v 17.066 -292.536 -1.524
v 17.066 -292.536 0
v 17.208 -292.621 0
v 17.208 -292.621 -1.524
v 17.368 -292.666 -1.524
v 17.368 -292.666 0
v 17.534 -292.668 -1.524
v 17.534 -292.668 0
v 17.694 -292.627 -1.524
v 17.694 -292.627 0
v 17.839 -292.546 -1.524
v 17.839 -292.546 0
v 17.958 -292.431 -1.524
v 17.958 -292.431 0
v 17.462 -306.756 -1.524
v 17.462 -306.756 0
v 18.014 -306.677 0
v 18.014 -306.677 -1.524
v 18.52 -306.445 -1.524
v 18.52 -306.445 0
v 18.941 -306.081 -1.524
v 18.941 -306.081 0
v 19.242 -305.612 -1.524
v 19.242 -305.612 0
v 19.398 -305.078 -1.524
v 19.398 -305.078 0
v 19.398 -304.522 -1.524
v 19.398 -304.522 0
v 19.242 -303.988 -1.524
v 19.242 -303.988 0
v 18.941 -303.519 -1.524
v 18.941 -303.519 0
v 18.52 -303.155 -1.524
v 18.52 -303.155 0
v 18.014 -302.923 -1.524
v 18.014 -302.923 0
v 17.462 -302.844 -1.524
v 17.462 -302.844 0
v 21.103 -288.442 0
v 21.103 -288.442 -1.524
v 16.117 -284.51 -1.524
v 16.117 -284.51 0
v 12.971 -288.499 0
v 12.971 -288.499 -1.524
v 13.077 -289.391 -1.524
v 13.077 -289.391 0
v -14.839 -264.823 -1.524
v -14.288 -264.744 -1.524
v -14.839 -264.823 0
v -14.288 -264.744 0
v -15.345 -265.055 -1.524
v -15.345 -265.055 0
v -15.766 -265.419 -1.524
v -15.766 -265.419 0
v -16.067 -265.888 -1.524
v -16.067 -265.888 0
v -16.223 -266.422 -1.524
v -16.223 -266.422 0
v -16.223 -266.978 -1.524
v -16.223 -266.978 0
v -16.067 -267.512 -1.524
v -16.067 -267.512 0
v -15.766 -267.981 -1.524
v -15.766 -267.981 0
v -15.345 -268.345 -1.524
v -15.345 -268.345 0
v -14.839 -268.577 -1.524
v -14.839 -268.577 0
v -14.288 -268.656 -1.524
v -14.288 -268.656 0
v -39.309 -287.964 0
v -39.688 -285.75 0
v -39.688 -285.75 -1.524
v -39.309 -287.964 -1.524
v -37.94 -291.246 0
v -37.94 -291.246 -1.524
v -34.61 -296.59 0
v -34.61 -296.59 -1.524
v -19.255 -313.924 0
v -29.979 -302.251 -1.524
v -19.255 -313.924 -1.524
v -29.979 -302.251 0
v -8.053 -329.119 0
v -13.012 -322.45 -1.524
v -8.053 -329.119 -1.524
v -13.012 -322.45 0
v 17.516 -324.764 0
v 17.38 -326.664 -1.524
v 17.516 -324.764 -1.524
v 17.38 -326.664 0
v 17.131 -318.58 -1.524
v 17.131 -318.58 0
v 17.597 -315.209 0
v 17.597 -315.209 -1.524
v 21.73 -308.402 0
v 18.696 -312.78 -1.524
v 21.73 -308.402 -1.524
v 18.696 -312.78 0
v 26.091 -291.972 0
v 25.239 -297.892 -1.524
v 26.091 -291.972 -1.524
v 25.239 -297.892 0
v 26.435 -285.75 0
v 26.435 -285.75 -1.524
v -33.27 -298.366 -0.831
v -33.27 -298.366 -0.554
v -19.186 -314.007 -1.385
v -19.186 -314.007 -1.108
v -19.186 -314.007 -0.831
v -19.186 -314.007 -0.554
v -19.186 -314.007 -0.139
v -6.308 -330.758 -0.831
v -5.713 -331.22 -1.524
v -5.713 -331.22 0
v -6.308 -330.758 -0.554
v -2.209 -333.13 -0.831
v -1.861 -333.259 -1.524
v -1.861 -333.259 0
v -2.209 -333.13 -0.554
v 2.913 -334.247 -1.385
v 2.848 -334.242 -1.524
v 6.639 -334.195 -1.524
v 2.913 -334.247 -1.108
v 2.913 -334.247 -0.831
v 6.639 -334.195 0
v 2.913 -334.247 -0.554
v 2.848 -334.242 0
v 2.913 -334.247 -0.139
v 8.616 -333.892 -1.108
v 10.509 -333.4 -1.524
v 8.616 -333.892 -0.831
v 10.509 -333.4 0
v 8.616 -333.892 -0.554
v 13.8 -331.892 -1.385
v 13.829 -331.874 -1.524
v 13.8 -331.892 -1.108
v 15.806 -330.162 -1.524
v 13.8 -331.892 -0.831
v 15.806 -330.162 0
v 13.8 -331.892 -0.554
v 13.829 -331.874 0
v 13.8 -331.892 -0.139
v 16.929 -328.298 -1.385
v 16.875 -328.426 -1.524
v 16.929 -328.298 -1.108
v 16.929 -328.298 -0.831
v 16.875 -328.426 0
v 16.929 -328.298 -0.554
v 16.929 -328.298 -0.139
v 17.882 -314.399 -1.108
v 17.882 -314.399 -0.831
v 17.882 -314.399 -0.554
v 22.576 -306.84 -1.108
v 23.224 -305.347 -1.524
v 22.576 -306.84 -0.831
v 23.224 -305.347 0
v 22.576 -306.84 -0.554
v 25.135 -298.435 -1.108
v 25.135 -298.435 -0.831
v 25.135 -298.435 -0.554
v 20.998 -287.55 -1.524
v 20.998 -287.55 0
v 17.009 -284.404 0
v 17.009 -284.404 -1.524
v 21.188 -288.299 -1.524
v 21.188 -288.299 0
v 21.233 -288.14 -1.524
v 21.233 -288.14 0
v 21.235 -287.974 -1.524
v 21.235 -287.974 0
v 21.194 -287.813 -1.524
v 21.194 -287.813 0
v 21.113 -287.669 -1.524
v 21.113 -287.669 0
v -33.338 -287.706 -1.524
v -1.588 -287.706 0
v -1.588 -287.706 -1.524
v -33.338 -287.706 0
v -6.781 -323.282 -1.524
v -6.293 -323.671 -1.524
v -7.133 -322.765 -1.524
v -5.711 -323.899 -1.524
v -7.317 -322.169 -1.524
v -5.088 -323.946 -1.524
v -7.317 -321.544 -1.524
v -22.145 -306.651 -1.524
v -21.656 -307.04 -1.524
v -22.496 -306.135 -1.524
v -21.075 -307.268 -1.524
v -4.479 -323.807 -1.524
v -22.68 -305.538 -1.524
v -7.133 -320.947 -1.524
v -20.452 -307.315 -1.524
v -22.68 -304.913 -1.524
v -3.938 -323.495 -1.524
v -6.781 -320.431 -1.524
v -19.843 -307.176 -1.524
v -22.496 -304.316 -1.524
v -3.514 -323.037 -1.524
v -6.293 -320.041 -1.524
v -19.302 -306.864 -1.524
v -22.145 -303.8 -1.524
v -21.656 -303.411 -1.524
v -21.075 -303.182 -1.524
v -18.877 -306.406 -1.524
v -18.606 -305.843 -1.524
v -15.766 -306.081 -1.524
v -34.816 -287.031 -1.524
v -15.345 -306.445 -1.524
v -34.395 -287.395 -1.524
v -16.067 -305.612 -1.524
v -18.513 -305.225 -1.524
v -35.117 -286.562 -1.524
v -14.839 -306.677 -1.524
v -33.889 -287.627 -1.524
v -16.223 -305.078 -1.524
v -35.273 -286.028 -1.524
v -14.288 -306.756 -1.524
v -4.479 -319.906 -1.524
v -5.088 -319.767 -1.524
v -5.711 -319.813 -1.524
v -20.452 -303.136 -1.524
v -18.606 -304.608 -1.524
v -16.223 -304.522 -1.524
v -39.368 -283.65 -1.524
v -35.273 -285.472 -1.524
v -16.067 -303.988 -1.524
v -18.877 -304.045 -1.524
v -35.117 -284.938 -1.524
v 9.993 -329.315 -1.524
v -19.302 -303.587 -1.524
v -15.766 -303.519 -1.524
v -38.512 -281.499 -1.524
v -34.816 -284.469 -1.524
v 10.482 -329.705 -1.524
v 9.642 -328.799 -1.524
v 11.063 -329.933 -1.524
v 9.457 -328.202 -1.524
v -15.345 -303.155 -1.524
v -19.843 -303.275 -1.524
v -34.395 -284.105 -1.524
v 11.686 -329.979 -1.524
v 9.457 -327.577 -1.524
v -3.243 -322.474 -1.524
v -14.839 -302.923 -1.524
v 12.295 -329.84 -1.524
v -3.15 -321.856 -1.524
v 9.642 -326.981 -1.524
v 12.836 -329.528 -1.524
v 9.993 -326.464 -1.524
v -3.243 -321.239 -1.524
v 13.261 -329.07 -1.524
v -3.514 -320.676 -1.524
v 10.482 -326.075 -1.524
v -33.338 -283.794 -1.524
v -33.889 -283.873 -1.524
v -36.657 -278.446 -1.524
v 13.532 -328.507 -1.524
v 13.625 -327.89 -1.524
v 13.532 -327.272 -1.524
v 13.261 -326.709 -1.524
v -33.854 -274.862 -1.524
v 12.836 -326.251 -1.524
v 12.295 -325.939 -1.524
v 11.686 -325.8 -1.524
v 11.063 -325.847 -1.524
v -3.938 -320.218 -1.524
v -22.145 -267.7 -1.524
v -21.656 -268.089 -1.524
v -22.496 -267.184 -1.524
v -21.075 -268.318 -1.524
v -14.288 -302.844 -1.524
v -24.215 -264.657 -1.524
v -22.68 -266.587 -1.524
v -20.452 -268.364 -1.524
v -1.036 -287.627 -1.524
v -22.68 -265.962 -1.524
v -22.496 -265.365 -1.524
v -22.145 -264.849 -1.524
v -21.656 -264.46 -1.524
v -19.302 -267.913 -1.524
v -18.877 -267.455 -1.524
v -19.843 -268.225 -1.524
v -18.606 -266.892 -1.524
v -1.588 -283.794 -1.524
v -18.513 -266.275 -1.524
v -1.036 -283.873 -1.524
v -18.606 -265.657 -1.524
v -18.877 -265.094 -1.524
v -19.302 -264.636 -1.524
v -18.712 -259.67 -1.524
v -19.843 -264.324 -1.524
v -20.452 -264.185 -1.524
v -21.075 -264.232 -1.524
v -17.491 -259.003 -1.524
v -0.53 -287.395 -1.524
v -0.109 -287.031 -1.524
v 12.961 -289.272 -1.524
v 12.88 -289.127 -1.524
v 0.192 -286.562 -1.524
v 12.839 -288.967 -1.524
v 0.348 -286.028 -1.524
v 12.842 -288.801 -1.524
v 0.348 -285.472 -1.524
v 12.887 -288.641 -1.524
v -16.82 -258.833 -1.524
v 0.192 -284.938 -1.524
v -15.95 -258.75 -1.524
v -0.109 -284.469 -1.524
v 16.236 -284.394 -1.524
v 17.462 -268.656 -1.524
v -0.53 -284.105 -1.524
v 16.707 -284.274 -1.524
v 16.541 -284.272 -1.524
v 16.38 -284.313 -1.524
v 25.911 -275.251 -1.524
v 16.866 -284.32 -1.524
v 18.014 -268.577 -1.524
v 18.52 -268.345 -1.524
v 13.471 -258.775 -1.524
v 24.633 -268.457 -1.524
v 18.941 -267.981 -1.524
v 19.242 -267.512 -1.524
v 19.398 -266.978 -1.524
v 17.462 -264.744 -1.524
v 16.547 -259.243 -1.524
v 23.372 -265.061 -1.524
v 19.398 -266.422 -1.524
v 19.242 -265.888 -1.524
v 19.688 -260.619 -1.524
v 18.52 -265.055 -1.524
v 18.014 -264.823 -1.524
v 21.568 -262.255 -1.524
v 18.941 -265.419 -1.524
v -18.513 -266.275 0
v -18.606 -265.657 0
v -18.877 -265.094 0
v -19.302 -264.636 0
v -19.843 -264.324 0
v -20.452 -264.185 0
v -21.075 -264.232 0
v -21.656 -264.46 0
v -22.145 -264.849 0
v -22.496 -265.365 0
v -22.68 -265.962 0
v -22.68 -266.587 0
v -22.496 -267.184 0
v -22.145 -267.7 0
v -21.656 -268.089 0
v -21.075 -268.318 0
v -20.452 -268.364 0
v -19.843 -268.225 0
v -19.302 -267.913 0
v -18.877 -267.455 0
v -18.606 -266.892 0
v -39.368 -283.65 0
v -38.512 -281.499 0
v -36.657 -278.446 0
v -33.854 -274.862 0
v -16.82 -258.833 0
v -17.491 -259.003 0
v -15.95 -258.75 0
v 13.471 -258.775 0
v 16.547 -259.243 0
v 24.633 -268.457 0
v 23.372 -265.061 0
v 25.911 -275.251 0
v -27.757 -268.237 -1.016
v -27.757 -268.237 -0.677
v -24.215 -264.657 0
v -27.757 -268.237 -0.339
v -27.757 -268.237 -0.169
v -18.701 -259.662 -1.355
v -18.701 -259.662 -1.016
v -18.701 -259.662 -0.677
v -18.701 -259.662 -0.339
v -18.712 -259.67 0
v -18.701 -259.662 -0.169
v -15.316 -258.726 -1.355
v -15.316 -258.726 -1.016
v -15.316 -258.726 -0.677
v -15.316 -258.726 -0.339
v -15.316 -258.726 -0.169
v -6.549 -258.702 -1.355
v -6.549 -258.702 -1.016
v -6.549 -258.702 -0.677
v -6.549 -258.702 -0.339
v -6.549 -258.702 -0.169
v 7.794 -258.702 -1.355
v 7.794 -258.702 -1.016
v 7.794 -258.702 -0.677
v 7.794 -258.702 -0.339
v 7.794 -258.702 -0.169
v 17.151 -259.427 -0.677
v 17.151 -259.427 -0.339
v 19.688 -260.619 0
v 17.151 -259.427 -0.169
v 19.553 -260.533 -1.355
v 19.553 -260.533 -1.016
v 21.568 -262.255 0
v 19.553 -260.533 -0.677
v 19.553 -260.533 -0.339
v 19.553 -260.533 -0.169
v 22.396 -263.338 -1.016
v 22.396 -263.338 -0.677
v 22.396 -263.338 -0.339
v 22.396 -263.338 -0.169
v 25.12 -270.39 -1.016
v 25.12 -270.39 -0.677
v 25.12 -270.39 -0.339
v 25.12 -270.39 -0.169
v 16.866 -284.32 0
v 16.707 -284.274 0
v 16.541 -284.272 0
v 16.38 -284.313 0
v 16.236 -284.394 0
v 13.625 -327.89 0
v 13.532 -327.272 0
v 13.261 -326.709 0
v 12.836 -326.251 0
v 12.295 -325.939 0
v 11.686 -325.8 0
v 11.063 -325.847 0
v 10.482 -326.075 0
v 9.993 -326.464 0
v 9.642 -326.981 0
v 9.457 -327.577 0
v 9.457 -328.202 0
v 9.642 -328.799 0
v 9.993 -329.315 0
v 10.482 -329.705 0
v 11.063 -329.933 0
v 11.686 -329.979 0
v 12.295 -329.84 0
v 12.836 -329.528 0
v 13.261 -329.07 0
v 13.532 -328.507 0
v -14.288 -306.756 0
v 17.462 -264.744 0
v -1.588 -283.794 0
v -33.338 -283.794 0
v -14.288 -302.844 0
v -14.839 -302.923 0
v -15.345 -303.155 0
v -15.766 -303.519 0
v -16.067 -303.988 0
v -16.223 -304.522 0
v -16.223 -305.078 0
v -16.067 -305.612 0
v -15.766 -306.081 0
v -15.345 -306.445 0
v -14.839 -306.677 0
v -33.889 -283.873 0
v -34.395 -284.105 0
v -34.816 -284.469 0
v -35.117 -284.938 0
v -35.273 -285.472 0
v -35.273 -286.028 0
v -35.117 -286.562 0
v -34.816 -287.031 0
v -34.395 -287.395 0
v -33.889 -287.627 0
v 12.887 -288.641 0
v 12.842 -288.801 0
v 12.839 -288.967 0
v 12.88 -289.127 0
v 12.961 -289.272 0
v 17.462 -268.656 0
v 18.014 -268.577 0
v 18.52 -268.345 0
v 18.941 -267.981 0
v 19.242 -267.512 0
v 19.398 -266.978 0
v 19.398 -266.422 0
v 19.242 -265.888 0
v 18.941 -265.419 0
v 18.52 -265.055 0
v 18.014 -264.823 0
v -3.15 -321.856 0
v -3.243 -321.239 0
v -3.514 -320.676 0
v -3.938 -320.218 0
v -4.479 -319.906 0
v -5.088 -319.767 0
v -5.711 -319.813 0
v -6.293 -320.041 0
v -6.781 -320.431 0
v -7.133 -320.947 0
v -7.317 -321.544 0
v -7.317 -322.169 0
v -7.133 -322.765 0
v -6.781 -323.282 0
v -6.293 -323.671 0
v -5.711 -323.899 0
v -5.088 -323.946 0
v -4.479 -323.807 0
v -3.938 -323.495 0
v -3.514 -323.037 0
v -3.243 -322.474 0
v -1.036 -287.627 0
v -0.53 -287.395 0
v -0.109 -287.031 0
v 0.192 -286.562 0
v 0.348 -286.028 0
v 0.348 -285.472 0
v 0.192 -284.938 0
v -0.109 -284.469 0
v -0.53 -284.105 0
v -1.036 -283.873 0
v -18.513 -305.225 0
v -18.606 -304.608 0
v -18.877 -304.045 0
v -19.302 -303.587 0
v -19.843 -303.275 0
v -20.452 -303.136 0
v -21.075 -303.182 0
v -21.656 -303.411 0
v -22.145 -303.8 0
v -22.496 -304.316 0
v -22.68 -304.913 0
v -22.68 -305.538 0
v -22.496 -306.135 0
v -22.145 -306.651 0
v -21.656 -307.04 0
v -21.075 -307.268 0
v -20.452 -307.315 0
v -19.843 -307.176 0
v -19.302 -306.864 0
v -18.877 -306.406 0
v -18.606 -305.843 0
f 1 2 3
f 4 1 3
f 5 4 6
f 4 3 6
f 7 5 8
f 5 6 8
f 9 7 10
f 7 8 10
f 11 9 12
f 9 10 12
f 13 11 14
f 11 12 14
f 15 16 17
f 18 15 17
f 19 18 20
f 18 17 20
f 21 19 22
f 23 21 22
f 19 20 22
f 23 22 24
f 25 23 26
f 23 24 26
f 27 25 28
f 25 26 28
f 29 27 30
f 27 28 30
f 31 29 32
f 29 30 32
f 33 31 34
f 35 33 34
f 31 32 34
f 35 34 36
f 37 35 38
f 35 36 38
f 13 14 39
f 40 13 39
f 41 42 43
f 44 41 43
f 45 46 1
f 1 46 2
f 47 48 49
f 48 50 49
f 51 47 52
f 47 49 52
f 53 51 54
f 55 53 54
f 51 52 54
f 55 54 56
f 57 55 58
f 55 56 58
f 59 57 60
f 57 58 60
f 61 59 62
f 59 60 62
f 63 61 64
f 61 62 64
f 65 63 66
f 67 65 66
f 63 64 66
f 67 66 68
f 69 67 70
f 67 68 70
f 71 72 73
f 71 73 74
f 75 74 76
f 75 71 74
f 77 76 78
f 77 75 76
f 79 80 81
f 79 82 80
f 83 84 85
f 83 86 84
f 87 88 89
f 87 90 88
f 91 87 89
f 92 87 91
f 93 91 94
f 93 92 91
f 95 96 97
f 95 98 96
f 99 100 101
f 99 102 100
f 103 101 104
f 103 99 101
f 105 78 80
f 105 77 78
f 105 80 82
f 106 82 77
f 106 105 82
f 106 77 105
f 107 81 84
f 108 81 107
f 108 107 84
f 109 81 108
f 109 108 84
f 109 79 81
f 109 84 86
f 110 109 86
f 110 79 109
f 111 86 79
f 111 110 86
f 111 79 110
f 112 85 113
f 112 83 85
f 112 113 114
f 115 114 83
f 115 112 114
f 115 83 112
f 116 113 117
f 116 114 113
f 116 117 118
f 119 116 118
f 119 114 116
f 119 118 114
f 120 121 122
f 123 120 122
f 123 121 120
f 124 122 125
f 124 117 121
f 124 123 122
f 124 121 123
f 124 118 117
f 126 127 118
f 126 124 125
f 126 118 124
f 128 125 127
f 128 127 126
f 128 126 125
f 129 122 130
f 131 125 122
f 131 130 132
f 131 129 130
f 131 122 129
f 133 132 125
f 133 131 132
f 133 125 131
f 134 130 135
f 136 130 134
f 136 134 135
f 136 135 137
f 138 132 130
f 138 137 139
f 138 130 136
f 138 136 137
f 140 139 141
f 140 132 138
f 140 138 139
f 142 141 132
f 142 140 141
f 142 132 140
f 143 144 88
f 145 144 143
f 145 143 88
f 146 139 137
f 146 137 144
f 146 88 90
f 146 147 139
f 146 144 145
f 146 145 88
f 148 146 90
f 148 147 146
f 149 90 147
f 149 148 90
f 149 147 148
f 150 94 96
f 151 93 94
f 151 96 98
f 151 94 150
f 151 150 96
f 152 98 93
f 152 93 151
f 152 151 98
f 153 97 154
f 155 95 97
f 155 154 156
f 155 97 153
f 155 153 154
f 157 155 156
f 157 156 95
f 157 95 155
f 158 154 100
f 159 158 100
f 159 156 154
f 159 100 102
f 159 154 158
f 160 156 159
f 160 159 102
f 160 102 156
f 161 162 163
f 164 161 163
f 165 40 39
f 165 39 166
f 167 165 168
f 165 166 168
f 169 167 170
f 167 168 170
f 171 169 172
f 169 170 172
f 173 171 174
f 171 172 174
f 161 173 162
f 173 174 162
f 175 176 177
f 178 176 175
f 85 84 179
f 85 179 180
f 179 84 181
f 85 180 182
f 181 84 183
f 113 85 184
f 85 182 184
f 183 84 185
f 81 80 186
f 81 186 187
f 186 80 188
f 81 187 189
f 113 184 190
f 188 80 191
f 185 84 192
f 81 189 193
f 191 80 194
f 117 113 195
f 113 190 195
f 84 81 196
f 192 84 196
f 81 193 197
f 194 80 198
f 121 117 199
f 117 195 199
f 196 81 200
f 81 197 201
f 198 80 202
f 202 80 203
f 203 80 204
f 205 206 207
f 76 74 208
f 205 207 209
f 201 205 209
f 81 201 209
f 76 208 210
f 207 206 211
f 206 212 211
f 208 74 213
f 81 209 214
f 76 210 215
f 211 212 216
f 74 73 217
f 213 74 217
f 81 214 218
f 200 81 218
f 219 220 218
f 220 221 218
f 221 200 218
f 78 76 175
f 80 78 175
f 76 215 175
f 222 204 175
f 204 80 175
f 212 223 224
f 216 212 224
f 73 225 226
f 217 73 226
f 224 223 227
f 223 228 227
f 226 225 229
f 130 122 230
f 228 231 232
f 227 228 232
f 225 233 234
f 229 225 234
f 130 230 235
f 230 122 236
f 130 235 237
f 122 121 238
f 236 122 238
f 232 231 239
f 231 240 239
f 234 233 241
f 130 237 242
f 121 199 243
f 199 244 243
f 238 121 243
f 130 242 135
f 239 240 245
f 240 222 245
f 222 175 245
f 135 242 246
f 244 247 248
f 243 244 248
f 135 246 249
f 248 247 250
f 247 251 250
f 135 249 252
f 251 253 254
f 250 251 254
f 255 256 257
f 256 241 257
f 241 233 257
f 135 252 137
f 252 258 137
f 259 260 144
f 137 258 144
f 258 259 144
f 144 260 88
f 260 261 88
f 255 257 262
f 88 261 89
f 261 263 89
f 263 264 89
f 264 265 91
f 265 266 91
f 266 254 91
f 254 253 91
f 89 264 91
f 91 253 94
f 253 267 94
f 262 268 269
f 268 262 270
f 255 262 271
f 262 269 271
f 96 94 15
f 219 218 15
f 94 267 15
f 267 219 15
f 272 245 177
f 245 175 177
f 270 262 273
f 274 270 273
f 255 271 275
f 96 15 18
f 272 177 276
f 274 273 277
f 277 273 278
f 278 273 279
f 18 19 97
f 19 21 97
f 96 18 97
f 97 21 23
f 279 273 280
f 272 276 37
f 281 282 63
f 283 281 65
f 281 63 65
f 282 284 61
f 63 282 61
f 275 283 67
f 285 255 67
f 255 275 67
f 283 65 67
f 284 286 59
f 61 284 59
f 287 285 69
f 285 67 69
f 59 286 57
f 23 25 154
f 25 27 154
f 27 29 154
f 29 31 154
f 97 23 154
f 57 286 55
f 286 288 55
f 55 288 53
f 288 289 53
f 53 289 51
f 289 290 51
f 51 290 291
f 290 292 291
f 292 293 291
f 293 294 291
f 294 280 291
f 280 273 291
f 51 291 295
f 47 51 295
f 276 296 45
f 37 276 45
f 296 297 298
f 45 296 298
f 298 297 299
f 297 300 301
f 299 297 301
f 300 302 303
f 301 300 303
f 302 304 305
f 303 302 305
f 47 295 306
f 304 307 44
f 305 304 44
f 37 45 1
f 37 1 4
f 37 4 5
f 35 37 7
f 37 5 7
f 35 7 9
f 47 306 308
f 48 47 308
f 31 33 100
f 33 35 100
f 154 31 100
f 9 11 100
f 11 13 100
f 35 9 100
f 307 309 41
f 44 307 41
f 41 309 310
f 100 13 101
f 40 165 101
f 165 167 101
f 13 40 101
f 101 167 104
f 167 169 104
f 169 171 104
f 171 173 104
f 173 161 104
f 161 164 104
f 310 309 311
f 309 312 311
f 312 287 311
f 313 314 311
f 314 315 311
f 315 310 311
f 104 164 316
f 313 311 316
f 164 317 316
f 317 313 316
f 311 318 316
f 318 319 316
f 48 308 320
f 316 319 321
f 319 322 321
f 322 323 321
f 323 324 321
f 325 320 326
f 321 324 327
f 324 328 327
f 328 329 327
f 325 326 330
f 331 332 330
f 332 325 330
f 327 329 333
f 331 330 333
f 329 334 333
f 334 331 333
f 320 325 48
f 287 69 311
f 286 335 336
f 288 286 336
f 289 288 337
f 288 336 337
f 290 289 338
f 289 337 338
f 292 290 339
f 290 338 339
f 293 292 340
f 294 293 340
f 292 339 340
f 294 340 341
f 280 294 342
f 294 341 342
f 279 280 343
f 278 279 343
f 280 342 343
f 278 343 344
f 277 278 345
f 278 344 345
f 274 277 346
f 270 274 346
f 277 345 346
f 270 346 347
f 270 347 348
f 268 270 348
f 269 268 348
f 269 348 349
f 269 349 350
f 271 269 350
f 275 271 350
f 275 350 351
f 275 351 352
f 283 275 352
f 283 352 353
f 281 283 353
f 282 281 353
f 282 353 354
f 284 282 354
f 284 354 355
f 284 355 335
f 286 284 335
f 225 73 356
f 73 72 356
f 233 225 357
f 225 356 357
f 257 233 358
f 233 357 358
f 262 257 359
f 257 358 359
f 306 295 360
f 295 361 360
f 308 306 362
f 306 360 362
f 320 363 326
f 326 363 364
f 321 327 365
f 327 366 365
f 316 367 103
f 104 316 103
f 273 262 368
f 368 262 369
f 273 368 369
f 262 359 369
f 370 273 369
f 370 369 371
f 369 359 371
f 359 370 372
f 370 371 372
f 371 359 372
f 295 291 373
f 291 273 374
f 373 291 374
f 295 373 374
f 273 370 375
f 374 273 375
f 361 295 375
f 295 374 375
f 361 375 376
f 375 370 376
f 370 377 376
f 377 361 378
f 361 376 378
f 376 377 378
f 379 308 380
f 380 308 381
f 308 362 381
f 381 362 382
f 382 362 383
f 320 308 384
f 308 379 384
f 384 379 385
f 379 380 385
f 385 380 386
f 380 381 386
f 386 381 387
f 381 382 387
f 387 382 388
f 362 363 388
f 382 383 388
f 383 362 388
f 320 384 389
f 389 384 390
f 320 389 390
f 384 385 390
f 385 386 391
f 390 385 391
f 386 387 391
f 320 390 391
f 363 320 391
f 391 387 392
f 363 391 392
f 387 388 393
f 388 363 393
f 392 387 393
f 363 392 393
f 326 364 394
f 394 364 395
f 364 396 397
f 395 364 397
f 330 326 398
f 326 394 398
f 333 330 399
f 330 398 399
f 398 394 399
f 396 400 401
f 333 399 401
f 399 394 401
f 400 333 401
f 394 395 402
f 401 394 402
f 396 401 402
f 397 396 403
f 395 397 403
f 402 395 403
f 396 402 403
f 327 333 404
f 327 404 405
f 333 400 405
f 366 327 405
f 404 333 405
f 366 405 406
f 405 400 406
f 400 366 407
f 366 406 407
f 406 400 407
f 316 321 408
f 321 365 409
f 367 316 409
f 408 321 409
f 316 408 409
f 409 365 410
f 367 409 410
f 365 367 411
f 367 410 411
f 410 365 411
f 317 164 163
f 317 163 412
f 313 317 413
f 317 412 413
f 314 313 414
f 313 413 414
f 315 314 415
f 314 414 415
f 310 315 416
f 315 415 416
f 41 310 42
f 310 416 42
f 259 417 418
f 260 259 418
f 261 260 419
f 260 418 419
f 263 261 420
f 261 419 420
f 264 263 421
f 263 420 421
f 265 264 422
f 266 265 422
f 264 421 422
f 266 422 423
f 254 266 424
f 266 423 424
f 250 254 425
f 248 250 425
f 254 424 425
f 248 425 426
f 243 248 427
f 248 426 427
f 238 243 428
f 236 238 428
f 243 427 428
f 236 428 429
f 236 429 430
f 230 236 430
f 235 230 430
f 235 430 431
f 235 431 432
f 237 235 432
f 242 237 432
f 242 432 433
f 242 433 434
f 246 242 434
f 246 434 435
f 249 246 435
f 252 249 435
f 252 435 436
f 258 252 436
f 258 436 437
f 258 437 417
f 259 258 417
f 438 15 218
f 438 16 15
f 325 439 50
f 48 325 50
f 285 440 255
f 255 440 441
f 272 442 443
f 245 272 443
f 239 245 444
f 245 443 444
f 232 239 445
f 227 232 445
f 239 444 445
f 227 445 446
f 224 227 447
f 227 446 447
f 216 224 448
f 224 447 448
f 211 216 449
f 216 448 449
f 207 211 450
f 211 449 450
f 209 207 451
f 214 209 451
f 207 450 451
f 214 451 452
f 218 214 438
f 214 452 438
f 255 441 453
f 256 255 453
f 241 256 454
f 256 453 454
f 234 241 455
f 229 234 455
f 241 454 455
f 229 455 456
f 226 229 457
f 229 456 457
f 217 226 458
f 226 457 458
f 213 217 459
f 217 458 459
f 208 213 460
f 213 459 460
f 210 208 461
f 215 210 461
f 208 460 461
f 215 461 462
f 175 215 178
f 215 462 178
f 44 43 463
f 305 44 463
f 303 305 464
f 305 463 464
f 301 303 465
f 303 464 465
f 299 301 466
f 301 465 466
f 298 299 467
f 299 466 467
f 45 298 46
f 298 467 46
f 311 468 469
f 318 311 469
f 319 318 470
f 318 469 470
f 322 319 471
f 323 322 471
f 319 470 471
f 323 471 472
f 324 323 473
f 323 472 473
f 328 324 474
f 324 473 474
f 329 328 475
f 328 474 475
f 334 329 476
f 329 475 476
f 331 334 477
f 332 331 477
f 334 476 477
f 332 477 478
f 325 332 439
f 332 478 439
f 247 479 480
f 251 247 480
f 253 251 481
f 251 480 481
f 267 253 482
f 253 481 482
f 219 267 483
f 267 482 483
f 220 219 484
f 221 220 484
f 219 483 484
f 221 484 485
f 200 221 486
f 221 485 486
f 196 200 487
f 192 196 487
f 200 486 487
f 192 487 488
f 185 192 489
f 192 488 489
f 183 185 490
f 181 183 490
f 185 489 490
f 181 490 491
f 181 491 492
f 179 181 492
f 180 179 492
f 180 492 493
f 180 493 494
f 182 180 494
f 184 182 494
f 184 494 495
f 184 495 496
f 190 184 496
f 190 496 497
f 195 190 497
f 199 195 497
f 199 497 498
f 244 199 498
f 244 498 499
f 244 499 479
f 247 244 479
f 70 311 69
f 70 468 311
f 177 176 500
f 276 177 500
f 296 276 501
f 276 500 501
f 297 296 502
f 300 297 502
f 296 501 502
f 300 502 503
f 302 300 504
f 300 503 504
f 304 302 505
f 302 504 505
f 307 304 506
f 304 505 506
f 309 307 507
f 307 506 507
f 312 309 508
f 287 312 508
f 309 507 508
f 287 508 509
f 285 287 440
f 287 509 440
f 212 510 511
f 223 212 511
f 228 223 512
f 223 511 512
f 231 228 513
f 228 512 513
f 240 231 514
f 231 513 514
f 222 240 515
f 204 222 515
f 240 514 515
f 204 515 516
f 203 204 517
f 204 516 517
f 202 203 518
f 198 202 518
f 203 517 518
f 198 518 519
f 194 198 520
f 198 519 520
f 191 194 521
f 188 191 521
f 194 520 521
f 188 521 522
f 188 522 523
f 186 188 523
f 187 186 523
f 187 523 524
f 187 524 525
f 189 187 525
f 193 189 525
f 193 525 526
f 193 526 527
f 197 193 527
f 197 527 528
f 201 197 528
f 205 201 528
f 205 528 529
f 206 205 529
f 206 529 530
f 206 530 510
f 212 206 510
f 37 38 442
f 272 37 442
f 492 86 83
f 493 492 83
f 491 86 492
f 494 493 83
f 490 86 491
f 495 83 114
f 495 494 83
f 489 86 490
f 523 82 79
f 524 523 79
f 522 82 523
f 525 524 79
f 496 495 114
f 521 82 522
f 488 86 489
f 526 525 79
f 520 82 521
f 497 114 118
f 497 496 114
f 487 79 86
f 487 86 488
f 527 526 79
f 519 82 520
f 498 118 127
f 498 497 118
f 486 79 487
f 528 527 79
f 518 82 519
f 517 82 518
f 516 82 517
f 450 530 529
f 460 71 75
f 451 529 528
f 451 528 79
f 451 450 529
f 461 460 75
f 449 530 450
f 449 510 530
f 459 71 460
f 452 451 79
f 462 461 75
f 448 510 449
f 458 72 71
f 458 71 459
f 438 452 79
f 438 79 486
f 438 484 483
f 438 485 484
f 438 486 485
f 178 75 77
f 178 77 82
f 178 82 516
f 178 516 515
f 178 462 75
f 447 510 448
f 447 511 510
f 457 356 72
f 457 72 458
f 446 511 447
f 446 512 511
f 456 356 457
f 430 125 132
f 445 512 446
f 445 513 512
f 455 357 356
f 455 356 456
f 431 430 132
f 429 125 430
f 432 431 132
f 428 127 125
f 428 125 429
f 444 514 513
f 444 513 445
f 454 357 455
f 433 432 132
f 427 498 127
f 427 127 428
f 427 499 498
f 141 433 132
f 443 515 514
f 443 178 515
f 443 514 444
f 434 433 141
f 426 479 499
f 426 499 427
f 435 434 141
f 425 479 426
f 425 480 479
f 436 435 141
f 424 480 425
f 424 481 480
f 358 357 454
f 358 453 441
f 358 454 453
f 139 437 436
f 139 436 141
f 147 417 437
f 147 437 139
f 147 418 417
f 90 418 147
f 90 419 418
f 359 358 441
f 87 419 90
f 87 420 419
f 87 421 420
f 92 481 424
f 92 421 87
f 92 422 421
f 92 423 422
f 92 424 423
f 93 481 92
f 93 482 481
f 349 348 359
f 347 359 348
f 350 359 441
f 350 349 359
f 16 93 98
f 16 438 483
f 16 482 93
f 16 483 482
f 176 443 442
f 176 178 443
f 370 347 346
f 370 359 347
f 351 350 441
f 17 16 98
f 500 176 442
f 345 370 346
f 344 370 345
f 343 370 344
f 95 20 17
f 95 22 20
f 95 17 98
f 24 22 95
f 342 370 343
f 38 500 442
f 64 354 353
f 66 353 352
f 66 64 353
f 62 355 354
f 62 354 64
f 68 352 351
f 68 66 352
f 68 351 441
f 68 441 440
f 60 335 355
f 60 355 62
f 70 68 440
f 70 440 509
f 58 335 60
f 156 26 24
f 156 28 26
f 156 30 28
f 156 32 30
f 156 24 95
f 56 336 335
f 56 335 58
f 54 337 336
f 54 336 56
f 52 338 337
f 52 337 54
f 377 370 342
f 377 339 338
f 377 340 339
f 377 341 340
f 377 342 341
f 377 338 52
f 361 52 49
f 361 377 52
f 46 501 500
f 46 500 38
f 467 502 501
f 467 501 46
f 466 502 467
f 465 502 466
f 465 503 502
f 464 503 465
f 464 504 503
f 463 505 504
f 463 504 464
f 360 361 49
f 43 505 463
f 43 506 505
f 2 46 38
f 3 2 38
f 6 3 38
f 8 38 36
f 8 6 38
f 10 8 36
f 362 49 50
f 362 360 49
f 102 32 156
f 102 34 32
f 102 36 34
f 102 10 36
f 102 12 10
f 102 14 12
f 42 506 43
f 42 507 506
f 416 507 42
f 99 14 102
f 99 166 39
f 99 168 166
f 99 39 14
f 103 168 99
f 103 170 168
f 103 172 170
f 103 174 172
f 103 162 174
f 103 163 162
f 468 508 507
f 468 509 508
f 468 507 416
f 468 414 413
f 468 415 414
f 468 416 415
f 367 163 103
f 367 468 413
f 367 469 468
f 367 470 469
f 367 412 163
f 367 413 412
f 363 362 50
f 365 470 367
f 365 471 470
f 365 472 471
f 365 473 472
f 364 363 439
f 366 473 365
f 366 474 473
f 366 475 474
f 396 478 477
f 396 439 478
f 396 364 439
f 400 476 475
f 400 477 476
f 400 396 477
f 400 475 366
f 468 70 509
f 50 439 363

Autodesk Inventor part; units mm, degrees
ref_plane "YZ Plane" through (0, 0, 0) normal (1, 0, 0) x (0, 1, 0)
ref_plane "XZ Plane" through (0, 0, 0) normal (0, 1, 0) x (-1, 0, 0)
ref_plane "XY Plane" through (0, 0, 0) normal (0, 0, 1) x (1, 0, 0)
sketch "Sketch1" plane through (0, 0, 0) normal (0, 0, 1) x (1, 0, 0)
  line L0 (-1.5875, -283.7942) -> (-33.3375, -283.7942)
  line L1 (-1.5875, -287.7058) -> (-33.3375, -287.7058)
  arc A0 (-33.3375, -283.7942) -> (-33.3375, -287.7058) centre (-33.3375, -285.75) ccw
  arc A1 (-1.5875, -287.7058) -> (-1.5875, -283.7942) centre (-1.5875, -285.75) ccw
  line L2 (17.4625, -264.7442) -> (-14.2875, -264.7442)
  line L3 (17.4625, -268.6558) -> (-14.2875, -268.6558)
  arc A2 (-14.2875, -264.7442) -> (-14.2875, -268.6558) centre (-14.2875, -266.7) ccw
  arc A3 (17.4625, -268.6558) -> (17.4625, -264.7442) centre (17.4625, -266.7) ccw
  arc A4 (17.4625, -306.7558) -> (17.4625, -302.8442) centre (17.4625, -304.8) ccw
  line L4 (17.4625, -306.7558) -> (-14.2875, -306.7558)
  arc A5 (-14.2875, -302.8442) -> (-14.2875, -306.7558) centre (-14.2875, -304.8) ccw
  line L5 (17.4625, -302.8442) -> (-14.2875, -302.8442)
  line L6 (-1.5875, -285.75) -> (-33.3375, -285.75)
  line L7 (-39.6875, -285.75) -> (-39.6875, -281.3199) construction
  line L8 (-39.6875, -281.3199) -> (-31.1834, -271.3984) construction
  line L9 (-31.1834, -271.3984) -> (-18.9197, -259.2751) construction
  line L10 (-18.9197, -259.2751) -> (-17.4625, -258.7024) construction
  line L11 (-17.4625, -258.7024) -> (-13.3504, -258.7024) construction
  line L12 (-13.3504, -258.7024) -> (-9.7175, -258.7024) construction
  line L13 (-9.7175, -258.7024) -> (-3.3988, -258.7024) construction
  line L14 (-3.3988, -258.7024) -> (0.4625, -258.7024) construction
  line L15 (0.4625, -258.7024) -> (15.1943, -258.7024) construction
  line L16 (15.1943, -258.7024) -> (17.4625, -258.7024) construction
  line L17 (17.4625, -258.7024) -> (26.4353, -264.5027) construction
  line L18 (26.4353, -264.5027) -> (26.4353, -285.75) construction
  spline S0 degree 4 poles (-39.6875, -285.75) (-39.6875, -281.3199) (-31.1834, -271.3984) (-18.9197, -259.2751) (-17.4625, -258.7024) (-13.3504, -258.7024) (-9.7175, -258.7024) (-3.3988, -258.7024) (0.4625, -258.7024) (15.1943, -258.7024) (17.4625, -258.7024) (26.4353, -264.5027) (26.4353, -285.75) knots 1 1 1 1 1 2 3 4 5 6 7 8 9 10 10 10 10 10
  line L19 (20.9977, -287.5498) -> (17.0087, -284.4043)
  arc A6 (21.1032, -288.4416) -> (20.9977, -287.5498) centre (20.6045, -288.0484) ccw
  line L20 (17.9577, -292.4306) -> (21.1032, -288.4416)
  arc A7 (17.0659, -292.5361) -> (17.9577, -292.4306) centre (17.4591, -292.0375) ccw
  line L21 (13.0768, -289.3906) -> (17.0659, -292.5361)
  arc A8 (12.9714, -288.4988) -> (13.0768, -289.3906) centre (13.47, -288.892) ccw
  line L22 (16.1169, -284.5098) -> (12.9714, -288.4988)
  arc A9 (17.0087, -284.4043) -> (16.1169, -284.5098) centre (16.6155, -284.9029) ccw
  circle A10 centre (-20.6084, -305.2253) radius 2.0955
  circle A11 centre (-20.6084, -266.2747) radius 2.0955
  circle A12 centre (11.5295, -327.8898) radius 2.0955
  line L23 (-39.6875, -285.75) -> (-39.6875, -288.4988) construction
  line L24 (-39.6875, -288.4988) -> (-35.4355, -296.4735) construction
  line L25 (-35.4355, -296.4735) -> (-28.6542, -303.7638) construction
  line L26 (-28.6542, -303.7638) -> (-22.7039, -309.9306) construction
  line L27 (-22.7039, -309.9306) -> (-15.6661, -317.7268) construction
  line L28 (-15.6661, -317.7268) -> (-9.739, -328.1678) construction
  line L29 (-9.739, -328.1678) -> (-3.3988, -334.115) construction
  line L30 (-3.3988, -334.115) -> (8.8016, -335.3618) construction
  line L31 (8.8016, -335.3618) -> (20.2246, -329.5087) construction
  line L32 (20.2246, -329.5087) -> (15.3145, -317.7268) construction
  line L33 (15.3145, -317.7268) -> (19.5304, -310.4349) construction
  line L34 (19.5304, -310.4349) -> (24.1196, -307.3208) construction
  line L35 (24.1196, -307.3208) -> (26.4353, -292.0468) construction
  line L36 (26.4353, -292.0468) -> (26.4353, -285.75) construction
  spline S1 degree 4 poles (-39.6875, -285.75) (-39.6875, -288.4988) (-35.4355, -296.4735) (-28.6542, -303.7638) (-22.7039, -309.9306) (-15.6661, -317.7268) (-9.739, -328.1678) (-3.3988, -334.115) (8.8016, -335.3618) (20.2246, -329.5087) (15.3145, -317.7268) (19.5304, -310.4349) (24.1196, -307.3208) (26.4353, -292.0468) (26.4353, -285.75) knots 1 1 1 1 1 2 3 4 5 6 7 8 9 10 11 12 12 12 12 12
  circle A13 centre (-5.245, -321.8562) radius 2.0955
  point P0 (0, 0)
  point P1 (-7.9375, -285.75)
  point P2 (11.1125, -266.7)
  point P3 (11.1125, -304.8)
  point P4 (19.4183, -304.8)
  dimension "d0" = 31.75
  dimension "d3" = 0
  dimension "d4" = 3.9116
  dimension "d5" = 0
  dimension "d8" = 3.9116
  dimension "d9" = 0
  dimension "d10" = 31.75
  dimension "d11" = 0
  dimension "d12" = 6.35
  dimension "d13" = 6.35
  dimension "d14" = 3.9116
  dimension "d15" = 0
  dimension "d16" = 31.75
  dimension "d19" = 0
  dimension "d20" = 6.35
  dimension "d57" = 6.35
  dimension "d58" = 0
  dimension "d60" = 0
  dimension "d61" = 7.017
  dimension "d64" = 4.191
  dimension "d67" = 4.191
  dimension "d70" = 4.191
  dimension "d73" = 4.191
extrude "Extrusion3" add sketch "Sketch1" against normal blind 1.524
equation "\"d8\" = d4"
equation "\"d10\" = d0"
equation "\"d13\" = d12"
equation "\"d14\" = d4"
equation "\"d16\" = d0"
equation "\"d20\" = d12"
properties part number "tracking-wheel-mount-v2"
